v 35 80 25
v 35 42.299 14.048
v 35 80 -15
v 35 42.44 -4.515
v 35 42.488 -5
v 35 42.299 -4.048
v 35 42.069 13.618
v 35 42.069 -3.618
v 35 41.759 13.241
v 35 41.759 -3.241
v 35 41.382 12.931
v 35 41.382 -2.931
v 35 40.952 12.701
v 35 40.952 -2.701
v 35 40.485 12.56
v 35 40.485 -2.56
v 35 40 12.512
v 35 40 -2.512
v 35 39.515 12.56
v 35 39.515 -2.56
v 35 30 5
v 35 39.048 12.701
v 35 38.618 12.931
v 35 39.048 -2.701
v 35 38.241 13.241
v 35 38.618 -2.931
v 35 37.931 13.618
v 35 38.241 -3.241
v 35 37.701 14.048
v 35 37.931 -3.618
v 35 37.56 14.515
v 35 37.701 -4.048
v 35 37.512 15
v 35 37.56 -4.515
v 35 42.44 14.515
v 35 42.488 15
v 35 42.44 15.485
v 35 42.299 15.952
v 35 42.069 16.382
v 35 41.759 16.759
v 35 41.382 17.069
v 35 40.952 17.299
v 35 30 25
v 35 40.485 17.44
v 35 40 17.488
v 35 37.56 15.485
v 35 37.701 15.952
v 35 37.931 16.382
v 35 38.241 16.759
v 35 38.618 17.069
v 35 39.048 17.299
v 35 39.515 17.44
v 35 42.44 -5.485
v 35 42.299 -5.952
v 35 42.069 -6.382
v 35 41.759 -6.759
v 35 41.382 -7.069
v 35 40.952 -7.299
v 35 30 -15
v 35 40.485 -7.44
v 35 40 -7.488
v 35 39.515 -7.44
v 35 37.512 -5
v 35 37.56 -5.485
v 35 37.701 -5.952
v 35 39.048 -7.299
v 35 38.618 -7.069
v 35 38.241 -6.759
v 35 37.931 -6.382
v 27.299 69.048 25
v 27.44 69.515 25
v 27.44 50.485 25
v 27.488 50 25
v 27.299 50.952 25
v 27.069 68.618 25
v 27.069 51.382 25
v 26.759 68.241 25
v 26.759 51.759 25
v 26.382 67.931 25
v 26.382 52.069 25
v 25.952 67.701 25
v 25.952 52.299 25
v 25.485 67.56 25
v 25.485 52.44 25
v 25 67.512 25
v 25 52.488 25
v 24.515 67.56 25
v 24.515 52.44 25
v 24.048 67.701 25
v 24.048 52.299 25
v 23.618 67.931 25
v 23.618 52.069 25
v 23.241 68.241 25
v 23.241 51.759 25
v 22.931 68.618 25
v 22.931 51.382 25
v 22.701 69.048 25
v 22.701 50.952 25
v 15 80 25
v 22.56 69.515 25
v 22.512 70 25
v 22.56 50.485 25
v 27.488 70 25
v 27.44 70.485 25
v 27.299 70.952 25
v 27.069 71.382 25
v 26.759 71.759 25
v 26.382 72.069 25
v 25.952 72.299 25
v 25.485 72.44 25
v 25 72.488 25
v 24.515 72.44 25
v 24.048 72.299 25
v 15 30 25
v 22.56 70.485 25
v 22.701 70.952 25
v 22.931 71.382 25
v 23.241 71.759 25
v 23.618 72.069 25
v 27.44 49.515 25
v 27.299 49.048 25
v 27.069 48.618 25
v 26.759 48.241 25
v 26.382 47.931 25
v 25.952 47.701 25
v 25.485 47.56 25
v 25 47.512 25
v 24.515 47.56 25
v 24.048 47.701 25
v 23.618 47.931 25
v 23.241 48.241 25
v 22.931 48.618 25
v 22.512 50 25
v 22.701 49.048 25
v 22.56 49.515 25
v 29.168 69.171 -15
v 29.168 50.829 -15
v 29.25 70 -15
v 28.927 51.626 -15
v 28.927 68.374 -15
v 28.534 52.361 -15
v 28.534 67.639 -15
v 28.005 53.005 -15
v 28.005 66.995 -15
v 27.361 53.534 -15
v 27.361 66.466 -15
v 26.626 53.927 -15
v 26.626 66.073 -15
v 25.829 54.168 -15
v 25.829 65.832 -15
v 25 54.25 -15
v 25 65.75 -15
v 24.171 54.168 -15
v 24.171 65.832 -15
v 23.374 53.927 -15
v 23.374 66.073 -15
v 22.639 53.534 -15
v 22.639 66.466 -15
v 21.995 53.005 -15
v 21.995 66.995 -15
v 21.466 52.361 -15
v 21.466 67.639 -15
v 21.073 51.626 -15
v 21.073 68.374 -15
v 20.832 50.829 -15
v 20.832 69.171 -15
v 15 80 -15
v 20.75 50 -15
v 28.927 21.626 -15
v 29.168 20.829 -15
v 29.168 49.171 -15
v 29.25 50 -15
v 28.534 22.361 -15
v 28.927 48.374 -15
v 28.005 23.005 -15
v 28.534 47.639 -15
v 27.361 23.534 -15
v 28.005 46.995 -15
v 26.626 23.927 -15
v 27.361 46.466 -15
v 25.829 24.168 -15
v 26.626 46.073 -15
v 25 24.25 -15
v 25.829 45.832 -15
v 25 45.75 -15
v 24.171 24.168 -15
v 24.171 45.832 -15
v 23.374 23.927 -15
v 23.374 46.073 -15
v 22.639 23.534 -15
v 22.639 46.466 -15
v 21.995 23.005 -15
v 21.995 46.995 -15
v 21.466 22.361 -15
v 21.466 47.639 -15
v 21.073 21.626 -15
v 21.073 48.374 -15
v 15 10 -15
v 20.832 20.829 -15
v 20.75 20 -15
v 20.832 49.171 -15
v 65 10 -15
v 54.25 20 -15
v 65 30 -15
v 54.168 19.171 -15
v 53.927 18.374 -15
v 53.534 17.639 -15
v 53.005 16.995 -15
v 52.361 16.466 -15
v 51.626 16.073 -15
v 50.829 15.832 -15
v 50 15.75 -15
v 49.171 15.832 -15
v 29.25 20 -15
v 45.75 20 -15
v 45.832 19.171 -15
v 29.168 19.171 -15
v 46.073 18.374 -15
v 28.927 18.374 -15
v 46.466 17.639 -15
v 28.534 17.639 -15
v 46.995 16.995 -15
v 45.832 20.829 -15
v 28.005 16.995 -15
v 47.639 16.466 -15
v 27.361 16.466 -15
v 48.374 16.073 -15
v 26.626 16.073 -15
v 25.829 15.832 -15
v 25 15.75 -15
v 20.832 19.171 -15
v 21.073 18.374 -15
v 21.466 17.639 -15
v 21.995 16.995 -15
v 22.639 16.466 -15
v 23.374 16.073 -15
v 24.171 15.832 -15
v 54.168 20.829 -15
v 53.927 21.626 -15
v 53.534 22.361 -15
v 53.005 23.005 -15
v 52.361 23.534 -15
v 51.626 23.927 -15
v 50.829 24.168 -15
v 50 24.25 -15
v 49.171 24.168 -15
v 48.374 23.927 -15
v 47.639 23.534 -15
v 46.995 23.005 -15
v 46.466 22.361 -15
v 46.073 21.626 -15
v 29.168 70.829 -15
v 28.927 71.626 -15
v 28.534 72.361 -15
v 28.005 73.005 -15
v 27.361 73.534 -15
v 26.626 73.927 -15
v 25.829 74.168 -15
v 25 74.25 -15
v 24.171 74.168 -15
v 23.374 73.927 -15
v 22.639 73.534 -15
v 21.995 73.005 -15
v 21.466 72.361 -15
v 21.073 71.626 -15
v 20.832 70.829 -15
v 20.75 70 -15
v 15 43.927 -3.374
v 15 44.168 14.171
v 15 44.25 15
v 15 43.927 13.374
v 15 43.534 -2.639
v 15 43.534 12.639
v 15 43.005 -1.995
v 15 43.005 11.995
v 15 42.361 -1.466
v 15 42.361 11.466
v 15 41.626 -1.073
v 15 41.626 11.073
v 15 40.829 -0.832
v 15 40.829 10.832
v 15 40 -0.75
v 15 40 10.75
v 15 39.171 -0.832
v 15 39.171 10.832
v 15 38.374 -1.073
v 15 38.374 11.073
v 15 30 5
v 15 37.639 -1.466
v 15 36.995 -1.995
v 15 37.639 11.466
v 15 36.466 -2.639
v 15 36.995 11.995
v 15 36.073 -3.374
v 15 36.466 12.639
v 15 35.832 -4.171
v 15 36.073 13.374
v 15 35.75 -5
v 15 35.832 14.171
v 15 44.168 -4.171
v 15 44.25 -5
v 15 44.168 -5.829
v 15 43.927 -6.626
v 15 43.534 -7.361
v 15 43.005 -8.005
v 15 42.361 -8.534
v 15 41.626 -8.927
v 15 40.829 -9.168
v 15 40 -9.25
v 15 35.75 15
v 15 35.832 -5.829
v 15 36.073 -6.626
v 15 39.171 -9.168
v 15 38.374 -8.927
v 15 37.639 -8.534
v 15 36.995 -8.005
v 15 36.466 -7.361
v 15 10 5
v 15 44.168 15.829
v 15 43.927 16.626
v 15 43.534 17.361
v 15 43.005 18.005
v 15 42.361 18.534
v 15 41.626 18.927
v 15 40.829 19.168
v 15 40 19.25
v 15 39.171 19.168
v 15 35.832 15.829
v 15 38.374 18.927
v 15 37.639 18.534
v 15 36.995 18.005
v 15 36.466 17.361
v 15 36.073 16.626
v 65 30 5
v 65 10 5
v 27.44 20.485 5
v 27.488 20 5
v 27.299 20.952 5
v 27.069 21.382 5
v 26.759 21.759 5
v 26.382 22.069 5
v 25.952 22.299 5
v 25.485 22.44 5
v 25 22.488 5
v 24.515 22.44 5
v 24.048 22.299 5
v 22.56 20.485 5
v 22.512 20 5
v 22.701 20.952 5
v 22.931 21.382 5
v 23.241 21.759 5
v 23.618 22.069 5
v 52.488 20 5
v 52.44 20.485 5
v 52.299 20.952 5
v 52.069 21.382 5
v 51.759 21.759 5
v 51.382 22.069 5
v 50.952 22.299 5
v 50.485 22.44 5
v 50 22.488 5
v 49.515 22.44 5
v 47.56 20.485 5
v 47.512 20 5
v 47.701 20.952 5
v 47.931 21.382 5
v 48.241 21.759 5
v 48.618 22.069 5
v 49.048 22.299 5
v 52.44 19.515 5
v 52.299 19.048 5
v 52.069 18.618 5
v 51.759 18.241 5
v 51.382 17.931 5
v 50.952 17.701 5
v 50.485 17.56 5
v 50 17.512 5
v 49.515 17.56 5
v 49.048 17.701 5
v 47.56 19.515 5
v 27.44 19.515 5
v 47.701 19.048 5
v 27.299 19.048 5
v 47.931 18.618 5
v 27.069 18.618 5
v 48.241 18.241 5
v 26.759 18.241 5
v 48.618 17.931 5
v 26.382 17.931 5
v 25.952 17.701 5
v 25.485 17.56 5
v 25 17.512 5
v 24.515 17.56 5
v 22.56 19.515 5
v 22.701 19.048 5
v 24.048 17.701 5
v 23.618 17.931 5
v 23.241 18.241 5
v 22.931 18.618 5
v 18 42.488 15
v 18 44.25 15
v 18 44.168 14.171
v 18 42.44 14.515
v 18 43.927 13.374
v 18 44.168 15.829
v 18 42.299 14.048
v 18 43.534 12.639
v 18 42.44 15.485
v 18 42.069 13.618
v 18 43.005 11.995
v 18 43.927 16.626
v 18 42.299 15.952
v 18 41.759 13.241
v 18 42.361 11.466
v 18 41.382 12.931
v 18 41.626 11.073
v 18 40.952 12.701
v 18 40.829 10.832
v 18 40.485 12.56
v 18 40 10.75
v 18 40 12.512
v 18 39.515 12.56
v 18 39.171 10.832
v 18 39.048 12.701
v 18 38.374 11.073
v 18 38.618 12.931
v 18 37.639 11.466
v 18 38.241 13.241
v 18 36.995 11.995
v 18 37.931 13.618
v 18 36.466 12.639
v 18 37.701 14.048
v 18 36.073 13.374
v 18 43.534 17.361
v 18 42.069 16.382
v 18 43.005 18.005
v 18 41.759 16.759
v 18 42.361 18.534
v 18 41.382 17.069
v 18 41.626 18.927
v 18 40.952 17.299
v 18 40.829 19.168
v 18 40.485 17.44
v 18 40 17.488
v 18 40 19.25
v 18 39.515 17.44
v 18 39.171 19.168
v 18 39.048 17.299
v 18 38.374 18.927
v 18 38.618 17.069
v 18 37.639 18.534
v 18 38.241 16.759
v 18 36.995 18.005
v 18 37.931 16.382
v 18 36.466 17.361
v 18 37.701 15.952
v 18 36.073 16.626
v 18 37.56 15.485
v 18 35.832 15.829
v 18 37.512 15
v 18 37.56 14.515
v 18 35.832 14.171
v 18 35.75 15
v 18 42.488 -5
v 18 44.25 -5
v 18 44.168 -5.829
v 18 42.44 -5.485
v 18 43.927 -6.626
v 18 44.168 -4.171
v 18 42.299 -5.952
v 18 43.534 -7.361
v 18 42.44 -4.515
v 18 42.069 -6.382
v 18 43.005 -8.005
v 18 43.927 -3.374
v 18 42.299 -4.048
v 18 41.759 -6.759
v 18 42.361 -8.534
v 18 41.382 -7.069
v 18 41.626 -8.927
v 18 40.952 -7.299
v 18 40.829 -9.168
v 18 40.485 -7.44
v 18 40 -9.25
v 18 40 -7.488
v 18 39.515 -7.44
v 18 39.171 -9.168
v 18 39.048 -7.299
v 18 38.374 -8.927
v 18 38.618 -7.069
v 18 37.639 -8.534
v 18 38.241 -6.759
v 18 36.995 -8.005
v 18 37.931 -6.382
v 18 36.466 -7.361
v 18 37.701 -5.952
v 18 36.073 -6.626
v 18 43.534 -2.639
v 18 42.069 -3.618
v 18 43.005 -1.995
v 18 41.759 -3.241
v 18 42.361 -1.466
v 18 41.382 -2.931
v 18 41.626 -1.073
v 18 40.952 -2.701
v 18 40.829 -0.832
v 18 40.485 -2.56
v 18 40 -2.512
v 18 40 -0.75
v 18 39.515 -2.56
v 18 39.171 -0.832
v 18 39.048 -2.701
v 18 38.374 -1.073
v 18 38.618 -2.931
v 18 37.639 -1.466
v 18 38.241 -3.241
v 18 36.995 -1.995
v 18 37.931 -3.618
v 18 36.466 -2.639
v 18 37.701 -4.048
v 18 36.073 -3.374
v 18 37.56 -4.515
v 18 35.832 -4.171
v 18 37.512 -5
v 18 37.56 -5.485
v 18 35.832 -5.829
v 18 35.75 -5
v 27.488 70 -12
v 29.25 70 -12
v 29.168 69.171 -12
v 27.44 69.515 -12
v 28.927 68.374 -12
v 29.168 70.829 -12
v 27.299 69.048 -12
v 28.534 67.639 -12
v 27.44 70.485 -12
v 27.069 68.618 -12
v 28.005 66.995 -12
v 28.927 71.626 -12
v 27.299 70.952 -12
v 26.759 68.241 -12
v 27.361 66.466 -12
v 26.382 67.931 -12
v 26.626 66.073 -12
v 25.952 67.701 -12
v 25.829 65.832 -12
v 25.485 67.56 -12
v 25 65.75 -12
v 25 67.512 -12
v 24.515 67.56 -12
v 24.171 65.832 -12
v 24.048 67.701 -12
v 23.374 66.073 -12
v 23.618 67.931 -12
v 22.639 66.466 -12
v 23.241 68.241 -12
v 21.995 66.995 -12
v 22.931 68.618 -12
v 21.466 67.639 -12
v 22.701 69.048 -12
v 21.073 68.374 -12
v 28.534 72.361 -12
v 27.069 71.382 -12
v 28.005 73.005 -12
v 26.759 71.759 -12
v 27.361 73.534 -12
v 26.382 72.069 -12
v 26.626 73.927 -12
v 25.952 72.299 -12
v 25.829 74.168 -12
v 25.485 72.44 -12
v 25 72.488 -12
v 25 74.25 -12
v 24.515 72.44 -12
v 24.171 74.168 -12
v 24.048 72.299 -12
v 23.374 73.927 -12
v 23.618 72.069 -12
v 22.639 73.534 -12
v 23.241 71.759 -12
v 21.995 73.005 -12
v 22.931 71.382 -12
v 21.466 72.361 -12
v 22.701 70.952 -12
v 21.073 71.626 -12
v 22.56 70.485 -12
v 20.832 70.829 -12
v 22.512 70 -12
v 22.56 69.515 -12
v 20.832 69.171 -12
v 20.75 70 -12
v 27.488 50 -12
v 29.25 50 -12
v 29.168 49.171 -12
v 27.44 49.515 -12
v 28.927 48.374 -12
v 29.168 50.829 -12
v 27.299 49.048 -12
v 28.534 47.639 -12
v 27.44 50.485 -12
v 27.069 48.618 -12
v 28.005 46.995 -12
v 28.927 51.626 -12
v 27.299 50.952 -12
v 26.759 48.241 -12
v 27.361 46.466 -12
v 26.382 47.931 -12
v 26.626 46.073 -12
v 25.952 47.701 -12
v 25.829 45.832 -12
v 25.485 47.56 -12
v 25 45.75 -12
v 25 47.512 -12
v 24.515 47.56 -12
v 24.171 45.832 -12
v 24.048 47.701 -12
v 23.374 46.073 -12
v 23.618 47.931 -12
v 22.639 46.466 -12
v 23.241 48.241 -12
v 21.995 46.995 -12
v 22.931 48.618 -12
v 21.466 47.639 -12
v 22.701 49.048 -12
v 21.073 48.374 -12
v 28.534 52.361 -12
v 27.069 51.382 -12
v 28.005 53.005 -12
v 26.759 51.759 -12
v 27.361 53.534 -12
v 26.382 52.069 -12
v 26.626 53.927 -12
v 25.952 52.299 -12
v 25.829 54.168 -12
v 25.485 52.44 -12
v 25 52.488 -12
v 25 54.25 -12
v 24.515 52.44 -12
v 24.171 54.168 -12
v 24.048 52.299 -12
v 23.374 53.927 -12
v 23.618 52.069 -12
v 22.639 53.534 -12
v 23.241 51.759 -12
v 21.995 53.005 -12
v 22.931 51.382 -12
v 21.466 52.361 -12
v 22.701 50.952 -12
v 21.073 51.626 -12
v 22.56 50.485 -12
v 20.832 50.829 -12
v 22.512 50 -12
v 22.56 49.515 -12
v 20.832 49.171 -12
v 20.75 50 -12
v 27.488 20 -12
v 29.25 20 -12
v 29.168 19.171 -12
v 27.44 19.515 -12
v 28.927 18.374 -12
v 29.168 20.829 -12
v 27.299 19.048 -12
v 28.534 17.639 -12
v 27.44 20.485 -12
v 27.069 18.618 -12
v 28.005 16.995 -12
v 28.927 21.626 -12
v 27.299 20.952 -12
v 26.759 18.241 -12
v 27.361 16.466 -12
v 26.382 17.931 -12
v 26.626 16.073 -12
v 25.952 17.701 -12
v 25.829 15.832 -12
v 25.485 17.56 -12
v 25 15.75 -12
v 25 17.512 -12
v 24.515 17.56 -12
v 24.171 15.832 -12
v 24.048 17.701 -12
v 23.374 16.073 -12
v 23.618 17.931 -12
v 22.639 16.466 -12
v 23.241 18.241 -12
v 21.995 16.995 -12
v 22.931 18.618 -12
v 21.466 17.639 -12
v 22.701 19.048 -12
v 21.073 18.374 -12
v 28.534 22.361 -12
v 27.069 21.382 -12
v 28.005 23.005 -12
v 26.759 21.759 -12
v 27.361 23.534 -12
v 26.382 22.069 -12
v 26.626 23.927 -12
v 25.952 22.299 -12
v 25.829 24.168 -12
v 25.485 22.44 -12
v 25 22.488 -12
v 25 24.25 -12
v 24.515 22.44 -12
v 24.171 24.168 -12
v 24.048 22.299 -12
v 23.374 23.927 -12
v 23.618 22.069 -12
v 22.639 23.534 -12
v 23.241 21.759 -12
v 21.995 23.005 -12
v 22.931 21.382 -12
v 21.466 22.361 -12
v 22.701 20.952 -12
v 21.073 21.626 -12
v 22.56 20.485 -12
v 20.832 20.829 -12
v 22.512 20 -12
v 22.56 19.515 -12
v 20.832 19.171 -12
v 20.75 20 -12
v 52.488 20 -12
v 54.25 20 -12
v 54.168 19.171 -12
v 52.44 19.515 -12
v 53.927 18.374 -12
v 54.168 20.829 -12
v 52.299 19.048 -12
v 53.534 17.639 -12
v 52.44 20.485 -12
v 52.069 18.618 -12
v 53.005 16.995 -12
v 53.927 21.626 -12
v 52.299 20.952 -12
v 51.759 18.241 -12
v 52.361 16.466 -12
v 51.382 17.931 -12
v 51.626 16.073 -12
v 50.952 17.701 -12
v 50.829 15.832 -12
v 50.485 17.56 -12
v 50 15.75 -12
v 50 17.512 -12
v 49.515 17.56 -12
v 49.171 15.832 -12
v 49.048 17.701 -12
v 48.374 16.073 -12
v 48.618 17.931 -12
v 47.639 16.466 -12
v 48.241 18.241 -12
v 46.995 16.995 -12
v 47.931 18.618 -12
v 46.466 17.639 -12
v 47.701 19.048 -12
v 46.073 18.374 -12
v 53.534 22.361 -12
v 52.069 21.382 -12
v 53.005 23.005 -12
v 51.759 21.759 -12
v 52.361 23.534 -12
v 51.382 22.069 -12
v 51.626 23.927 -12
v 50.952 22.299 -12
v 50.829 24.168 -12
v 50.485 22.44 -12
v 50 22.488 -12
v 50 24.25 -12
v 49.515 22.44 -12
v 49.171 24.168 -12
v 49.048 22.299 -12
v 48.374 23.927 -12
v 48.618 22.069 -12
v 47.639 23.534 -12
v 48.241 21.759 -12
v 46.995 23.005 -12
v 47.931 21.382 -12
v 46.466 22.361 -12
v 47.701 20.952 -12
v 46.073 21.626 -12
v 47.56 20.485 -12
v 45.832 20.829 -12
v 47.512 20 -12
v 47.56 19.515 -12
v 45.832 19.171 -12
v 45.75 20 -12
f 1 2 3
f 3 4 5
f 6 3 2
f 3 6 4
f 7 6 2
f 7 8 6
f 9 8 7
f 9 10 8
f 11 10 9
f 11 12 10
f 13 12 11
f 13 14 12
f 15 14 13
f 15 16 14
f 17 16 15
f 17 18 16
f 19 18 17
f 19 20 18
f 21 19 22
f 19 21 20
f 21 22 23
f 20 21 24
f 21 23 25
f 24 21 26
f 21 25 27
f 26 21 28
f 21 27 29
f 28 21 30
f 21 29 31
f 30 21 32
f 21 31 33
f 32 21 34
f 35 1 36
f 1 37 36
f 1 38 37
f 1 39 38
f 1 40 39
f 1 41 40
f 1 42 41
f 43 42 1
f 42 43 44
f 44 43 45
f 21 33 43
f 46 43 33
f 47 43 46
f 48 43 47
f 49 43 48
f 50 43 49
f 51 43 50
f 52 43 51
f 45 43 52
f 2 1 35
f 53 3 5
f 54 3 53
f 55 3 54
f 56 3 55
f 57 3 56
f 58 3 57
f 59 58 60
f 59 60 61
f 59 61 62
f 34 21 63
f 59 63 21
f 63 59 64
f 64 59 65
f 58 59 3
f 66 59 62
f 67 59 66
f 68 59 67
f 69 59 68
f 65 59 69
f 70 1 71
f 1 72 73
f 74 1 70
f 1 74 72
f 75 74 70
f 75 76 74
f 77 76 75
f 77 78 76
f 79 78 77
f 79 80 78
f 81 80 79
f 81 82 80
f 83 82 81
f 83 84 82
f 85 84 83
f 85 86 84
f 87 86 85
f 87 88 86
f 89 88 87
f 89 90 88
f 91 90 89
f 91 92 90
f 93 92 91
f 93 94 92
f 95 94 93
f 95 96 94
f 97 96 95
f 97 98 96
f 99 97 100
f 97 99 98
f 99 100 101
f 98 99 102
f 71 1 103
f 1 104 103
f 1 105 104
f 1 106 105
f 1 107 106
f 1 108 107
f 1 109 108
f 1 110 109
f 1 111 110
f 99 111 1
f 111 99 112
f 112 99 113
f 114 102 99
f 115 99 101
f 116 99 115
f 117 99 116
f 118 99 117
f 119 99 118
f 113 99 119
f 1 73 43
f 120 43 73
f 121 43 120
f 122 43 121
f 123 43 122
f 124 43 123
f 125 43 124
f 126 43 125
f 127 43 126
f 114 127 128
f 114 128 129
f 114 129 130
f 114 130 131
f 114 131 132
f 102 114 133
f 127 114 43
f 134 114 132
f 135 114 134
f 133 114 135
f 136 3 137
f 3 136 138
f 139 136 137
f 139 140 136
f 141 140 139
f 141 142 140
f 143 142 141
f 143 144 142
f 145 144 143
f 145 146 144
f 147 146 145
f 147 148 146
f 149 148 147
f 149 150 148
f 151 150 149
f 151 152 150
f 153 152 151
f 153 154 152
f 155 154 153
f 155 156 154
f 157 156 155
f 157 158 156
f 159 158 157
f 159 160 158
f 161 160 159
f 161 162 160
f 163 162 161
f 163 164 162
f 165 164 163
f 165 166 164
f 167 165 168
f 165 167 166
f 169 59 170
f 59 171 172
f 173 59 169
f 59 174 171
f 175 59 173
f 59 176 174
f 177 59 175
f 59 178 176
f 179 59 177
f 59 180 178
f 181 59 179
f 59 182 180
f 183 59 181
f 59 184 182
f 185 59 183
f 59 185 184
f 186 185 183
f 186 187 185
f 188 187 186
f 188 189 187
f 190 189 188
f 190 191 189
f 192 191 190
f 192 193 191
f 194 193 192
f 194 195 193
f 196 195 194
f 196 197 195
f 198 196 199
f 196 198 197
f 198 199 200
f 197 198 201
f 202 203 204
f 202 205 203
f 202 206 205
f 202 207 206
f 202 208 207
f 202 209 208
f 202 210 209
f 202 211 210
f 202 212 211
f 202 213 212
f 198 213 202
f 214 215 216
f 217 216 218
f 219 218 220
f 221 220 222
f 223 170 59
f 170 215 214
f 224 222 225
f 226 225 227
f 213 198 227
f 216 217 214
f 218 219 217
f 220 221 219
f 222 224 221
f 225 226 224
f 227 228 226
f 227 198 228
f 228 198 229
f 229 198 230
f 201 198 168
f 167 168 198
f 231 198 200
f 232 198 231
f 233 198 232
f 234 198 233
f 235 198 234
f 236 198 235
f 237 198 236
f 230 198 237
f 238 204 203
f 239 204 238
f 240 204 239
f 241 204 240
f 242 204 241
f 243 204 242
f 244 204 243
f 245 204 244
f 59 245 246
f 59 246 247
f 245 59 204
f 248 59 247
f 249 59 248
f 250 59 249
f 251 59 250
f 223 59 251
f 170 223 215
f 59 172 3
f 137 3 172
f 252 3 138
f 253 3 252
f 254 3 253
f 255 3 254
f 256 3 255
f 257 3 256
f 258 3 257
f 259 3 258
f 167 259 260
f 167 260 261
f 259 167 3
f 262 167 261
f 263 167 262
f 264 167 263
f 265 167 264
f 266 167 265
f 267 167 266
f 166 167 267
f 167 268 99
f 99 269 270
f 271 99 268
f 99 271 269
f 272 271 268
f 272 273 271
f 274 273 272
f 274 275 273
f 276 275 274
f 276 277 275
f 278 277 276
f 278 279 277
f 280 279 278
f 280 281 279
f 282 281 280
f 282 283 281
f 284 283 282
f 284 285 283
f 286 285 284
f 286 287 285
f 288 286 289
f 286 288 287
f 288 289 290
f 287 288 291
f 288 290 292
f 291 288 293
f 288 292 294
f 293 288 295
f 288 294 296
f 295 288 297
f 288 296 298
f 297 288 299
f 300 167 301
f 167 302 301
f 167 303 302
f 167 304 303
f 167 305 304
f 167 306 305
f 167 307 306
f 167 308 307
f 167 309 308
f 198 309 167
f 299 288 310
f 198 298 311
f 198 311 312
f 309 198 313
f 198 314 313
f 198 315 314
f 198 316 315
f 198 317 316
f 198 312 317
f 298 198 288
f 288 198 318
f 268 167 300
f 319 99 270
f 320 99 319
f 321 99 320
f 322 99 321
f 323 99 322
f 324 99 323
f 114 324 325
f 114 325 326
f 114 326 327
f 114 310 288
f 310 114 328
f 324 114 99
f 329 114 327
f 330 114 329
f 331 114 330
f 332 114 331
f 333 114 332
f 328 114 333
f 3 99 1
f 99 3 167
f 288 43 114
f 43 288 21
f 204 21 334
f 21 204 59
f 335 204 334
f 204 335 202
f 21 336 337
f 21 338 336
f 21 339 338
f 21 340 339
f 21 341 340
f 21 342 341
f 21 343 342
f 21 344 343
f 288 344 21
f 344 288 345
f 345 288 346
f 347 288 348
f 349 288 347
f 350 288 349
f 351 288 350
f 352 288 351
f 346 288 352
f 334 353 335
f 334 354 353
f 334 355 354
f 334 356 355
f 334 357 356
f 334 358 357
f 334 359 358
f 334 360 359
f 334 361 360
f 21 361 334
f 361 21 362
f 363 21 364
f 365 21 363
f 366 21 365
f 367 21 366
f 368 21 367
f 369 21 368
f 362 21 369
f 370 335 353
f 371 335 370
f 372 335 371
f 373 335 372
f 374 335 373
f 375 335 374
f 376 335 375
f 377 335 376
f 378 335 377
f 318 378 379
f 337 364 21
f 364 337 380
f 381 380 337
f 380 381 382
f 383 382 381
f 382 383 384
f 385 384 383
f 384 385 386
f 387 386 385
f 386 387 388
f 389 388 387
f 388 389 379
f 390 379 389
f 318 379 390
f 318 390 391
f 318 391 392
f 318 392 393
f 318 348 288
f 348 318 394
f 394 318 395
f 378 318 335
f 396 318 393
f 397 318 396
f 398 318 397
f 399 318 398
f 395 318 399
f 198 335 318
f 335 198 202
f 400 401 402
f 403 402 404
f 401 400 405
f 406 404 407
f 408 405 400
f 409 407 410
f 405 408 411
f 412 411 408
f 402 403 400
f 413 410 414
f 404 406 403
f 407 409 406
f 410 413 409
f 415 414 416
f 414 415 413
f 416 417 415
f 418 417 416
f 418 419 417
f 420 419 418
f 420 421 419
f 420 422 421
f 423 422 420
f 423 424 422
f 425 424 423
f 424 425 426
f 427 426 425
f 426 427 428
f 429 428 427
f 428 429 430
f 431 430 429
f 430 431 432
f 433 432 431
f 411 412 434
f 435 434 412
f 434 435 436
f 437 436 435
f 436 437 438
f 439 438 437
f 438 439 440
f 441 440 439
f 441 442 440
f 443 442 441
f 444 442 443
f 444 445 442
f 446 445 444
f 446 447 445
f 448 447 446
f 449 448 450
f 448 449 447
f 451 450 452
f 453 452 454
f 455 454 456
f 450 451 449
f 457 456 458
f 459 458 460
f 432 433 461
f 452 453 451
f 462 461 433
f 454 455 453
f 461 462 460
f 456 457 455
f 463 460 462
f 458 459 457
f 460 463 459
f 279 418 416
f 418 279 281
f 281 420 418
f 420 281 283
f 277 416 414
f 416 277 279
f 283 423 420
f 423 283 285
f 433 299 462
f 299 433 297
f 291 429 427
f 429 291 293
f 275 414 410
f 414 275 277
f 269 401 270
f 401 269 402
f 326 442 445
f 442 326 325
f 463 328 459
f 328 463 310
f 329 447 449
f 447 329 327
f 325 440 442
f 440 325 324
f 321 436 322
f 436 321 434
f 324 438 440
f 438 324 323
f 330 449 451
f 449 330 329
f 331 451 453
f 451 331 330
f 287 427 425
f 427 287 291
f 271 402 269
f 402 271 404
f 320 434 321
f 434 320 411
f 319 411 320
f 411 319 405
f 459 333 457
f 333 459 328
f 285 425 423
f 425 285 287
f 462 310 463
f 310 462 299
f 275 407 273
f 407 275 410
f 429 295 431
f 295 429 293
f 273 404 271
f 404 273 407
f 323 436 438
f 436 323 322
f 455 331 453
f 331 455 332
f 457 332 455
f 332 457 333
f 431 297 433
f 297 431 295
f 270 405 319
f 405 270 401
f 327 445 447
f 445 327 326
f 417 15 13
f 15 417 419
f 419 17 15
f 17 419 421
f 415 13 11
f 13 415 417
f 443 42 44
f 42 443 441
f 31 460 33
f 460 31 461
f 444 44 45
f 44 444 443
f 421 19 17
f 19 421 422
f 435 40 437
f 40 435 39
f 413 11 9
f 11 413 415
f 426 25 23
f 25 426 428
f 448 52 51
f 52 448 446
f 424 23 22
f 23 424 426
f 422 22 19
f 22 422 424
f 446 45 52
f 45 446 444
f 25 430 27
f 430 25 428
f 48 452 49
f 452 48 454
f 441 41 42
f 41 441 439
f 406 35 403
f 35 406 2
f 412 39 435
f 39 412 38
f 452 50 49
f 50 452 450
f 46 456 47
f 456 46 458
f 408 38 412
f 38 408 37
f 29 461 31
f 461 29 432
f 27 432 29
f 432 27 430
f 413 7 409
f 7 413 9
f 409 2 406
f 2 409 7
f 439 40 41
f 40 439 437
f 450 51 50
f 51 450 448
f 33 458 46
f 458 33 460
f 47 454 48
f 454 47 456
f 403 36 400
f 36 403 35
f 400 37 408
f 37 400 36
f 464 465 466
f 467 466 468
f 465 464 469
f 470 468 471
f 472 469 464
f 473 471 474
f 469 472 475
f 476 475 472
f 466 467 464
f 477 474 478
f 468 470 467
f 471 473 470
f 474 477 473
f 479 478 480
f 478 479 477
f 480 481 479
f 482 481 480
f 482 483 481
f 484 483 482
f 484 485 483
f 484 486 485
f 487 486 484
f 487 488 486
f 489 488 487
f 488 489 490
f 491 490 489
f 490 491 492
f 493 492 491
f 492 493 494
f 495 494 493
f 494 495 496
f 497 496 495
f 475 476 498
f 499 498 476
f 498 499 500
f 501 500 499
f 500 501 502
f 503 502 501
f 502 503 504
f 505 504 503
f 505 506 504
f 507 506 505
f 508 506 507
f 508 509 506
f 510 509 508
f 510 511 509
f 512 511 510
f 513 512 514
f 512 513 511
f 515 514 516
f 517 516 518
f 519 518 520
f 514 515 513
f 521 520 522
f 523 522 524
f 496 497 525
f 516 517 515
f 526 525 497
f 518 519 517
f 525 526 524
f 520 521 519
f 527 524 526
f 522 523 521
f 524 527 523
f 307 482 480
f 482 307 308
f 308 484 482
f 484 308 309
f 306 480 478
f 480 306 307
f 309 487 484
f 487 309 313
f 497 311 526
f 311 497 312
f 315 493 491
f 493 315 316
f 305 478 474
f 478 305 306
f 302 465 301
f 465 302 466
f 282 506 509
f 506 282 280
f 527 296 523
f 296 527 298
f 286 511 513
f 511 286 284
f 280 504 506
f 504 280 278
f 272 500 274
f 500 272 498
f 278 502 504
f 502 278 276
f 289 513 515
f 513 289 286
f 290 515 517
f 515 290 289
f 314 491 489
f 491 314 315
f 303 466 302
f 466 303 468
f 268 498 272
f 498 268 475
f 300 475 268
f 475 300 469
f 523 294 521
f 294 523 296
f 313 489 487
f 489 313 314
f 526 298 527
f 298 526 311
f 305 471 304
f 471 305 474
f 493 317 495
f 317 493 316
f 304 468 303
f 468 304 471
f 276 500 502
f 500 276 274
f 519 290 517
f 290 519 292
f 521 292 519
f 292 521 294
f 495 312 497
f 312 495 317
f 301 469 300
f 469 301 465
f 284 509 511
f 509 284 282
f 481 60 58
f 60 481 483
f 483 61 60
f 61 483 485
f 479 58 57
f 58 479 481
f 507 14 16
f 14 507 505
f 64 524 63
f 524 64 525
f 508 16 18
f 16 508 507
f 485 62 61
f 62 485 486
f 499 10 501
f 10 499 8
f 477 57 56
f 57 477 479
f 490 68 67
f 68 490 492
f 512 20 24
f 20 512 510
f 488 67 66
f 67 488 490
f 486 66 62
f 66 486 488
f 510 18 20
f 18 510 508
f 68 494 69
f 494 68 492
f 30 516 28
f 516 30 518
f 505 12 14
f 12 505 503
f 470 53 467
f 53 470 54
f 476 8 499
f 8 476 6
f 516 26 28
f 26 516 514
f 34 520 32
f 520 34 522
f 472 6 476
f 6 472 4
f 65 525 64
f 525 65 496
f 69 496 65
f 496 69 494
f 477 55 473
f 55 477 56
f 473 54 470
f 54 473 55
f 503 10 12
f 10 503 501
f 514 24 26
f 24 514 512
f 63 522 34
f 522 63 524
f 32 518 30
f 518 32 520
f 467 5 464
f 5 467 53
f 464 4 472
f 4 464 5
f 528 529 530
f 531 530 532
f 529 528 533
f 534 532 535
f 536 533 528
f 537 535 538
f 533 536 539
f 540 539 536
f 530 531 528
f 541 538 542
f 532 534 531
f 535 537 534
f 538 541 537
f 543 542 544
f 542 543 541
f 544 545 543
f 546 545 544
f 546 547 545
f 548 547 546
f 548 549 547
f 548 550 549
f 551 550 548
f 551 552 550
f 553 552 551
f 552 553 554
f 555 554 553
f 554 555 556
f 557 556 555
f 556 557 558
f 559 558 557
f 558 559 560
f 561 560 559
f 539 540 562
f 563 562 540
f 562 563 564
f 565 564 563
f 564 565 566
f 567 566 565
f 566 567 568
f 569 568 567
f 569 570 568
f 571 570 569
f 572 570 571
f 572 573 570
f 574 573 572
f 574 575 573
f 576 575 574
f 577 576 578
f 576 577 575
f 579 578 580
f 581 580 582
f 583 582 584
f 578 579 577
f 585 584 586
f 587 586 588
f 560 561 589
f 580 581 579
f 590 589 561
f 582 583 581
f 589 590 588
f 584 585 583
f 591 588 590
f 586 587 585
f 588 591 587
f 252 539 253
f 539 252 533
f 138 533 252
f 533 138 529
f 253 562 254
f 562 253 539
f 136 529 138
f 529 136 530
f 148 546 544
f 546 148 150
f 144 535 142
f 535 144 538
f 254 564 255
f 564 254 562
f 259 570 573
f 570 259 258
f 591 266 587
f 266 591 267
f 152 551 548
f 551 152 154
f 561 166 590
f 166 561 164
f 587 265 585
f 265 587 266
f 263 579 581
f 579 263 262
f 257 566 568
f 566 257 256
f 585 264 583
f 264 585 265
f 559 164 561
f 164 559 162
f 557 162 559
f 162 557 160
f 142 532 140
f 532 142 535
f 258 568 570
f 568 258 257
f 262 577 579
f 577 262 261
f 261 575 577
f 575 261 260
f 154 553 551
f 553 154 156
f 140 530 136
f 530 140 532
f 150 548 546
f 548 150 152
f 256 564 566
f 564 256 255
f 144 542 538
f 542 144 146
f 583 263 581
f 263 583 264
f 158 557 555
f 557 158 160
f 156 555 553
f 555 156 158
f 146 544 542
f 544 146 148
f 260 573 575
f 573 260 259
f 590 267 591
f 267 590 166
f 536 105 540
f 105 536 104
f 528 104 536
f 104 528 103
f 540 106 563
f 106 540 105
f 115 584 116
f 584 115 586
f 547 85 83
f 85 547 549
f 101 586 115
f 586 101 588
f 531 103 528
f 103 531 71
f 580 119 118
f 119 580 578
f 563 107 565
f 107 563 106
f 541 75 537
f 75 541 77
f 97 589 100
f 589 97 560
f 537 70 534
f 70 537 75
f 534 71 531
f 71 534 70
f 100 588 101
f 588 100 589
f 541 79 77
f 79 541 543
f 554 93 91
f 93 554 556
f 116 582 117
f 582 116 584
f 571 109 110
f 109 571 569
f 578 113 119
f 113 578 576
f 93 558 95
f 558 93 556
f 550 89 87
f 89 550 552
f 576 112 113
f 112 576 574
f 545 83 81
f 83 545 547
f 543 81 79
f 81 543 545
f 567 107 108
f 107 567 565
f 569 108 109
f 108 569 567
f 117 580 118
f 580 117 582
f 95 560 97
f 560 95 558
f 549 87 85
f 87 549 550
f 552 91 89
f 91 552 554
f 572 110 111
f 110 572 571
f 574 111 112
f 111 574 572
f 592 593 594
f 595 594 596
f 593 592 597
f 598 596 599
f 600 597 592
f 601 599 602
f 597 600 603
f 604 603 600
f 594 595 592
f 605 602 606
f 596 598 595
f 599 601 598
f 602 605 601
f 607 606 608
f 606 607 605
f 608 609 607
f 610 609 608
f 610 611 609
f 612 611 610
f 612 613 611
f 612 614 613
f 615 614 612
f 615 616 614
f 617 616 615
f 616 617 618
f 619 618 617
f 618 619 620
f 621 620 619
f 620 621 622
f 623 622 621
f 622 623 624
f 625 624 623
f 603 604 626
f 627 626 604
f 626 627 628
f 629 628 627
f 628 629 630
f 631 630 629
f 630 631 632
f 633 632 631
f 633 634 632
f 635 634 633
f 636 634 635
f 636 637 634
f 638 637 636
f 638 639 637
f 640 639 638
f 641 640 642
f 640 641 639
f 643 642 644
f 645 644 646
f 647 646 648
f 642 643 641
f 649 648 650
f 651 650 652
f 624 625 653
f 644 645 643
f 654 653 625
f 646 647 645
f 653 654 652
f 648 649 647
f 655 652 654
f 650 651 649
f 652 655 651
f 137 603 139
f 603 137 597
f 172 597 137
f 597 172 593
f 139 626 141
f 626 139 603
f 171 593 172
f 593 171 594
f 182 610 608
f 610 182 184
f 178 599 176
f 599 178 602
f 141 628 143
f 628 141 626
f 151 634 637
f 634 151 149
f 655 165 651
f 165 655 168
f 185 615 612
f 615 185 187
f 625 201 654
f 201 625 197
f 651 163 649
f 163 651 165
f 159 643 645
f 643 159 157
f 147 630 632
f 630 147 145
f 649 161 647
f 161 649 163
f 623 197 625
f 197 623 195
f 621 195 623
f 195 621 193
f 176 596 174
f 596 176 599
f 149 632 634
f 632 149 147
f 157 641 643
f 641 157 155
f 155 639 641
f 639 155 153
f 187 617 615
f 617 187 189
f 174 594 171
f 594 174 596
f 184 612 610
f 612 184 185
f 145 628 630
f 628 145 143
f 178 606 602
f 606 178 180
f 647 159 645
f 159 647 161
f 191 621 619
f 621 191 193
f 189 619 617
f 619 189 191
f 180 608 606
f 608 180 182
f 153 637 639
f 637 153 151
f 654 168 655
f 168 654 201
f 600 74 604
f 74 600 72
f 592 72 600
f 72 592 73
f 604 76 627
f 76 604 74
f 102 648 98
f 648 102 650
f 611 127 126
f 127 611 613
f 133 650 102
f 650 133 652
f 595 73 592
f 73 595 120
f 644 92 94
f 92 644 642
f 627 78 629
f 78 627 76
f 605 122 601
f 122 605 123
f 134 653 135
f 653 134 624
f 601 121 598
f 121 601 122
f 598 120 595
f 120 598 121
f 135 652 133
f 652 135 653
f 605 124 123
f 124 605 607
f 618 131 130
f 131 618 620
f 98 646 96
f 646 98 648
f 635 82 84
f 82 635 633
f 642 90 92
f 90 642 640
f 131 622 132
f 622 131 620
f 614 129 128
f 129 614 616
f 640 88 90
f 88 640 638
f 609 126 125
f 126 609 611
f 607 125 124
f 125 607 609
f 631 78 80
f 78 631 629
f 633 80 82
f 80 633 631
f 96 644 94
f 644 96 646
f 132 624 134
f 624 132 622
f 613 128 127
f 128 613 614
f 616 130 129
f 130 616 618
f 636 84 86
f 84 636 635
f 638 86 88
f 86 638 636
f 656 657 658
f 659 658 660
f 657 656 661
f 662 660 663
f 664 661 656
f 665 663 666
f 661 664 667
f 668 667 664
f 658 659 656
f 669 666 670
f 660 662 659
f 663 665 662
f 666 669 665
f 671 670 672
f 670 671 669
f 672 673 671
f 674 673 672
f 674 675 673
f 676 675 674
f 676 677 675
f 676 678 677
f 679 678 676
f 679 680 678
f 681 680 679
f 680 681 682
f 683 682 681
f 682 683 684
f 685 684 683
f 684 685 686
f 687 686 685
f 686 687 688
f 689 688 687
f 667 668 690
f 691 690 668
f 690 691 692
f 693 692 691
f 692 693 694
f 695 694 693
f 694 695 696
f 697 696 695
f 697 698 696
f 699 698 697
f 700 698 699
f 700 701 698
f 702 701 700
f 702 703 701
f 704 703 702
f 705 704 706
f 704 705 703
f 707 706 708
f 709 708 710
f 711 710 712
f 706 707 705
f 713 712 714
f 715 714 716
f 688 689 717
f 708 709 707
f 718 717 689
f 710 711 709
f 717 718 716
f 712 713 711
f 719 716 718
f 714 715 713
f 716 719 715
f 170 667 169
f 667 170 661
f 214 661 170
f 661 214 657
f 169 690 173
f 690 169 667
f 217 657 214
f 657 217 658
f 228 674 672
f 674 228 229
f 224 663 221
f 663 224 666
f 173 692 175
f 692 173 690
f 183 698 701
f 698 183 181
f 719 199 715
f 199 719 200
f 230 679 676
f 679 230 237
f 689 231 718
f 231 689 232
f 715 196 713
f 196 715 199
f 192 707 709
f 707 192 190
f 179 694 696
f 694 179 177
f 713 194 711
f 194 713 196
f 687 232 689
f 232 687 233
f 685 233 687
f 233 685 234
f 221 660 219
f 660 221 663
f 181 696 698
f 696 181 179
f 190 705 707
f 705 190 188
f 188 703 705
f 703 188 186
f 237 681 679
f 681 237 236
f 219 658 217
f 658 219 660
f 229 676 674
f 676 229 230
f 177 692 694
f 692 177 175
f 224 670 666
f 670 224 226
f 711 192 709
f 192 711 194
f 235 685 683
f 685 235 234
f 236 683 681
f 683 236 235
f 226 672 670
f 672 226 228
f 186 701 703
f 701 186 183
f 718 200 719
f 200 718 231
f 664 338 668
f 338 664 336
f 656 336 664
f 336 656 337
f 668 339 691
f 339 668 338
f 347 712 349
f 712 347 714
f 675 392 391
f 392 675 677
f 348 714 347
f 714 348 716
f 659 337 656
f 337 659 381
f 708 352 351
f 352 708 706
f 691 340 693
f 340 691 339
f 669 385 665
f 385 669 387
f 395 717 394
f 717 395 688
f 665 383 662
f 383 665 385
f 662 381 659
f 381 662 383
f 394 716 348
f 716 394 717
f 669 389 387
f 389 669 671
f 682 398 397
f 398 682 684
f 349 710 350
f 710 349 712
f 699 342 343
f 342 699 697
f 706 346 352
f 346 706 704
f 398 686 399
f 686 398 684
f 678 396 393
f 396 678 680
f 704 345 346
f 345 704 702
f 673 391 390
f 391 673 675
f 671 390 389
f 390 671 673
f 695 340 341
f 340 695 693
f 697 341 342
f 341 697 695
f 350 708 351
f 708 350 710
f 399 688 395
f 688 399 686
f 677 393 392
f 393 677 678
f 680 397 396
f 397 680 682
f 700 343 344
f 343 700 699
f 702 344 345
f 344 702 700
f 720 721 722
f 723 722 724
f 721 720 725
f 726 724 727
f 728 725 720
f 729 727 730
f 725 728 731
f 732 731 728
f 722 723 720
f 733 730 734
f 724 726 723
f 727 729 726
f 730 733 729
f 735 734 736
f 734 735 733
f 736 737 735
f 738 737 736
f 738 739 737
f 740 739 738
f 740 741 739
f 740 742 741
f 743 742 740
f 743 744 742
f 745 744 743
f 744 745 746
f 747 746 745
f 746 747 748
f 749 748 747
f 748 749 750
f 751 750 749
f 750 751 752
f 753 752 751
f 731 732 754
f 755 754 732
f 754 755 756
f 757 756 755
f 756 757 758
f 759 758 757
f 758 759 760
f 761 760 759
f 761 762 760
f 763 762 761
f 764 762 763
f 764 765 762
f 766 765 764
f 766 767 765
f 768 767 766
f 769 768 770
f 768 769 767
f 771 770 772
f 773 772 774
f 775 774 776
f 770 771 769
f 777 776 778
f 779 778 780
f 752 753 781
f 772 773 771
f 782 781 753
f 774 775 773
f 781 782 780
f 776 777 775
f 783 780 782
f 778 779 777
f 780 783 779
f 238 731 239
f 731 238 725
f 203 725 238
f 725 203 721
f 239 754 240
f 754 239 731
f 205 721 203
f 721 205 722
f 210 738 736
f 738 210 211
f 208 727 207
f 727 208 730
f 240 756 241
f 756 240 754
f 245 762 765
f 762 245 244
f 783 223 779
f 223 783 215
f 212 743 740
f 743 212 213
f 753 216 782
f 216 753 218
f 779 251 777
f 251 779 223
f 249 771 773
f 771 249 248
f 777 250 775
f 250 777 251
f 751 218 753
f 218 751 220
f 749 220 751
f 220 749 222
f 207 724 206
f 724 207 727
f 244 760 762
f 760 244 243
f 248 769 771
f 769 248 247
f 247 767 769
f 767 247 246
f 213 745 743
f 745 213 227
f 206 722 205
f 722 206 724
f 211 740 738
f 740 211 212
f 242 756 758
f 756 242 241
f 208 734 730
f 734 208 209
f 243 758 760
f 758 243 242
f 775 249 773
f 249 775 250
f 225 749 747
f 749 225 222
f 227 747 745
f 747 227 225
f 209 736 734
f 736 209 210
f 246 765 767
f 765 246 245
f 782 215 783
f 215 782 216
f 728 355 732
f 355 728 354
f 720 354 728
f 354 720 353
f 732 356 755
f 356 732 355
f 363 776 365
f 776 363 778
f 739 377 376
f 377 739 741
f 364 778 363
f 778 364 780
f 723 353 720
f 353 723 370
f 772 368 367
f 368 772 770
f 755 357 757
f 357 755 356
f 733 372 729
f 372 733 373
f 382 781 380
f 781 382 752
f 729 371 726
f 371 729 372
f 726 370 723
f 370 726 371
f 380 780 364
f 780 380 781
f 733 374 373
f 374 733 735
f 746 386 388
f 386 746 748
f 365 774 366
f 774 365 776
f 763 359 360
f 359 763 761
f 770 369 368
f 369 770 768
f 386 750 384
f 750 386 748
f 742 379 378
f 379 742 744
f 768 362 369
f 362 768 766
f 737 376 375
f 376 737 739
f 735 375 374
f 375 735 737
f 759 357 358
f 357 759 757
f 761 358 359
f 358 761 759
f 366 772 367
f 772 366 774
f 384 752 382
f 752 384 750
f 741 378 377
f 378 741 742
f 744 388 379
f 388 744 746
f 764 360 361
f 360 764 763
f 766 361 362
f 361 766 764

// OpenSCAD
// file: triangle.scad
//Copyright Austin Floyd 2013
//http://www.thingiverse.com/thing:119050
//license GNU GPL
//austin.floyd at 3DprintGeeks (dot) com

//global variables.. if not set when calling wedge it will use these values. 
//The prefix st_ is to "namespace" the global variables so they're not accidentally overridden elsewhere


//The top angle of the right triangle
st_wedgeAngle=12; // [0.01:89.99]

//The height of the triangle (width auto-generated based on this)
st_wedgeHeight=27; // [0.01:200]

//Depth (thickness) of triangle
st_wedgeWidth=2.2; // [0.01:200]

//Increased or decreased percentage (50% would be 0.5) of top point vs bottom point
st_topFactor=0.5; // [0,0.1,0.2,0.3,0.4,0.5,0.6,0.7,0.8,0.9,1]

//Whether or not to center on x/y/z
st_center=false; // [true, false]

//Flip it upside down
st_invert=false; // [true, false]

//default wedge
//wedge();

//demo of several different wedges
demo();

module demo() {
	translate([0,0,15])
	wedge(angle=75,height=10, wedgeWidth=5);

	wedge(angle=75,height=5,topFactor=.25, center=true, wedgeWidth=10);

	translate([0,0,-15])
	wedge(angle=35,height=13,center=true);

	translate([0,0,-30])
	wedge(angle=35,height=6, center=true, invert=true);
}


module wedge(angle=st_wedgeAngle, height=st_wedgeHeight, wedgeWidth=st_wedgeWidth, topFactor=st_topFactor, center=st_center, invert=st_invert) {
	angle2=180-90-angle;
	hyp=height/sin(angle2);
	width=sqrt(pow(hyp,2)-pow(height,2));
	if (!invert) {
		triangle(height, width, center, topFactor, wedgeWidth);
	}
	if (invert) {
		rotate(180,[1,0,0])
		triangle(height, width, center, topFactor, wedgeWidth);
	}
}
module triangle(height=5, width=5, center=false, topFactor=0.5, wedgeWidth) {
	triangles=[[0,1,4],[5,4,1],		// top
					[1,2,5],[2,3,4],		// sides
					[3,0,4], [4,5,2],	//back
           	[2,1,0], [2,0,3]]; // base
	halfWidth=width/2;
	halfWWidth=wedgeWidth/2;
	topWidth=wedgeWidth*topFactor;
	halfTopWidth=topWidth/2;
	topHalfDiff=(wedgeWidth-topWidth)/2;
	halfHeight=height/2;
	if (center) {
		polyhedron(
  			points=[/*0*/[halfWidth,halfWWidth,-halfHeight],/*1*/[halfWidth,-halfWWidth,-halfHeight],				//front point
					  /*2*/[-halfWidth,-halfWWidth,-halfHeight],       /*3*/[-halfWidth,halfWWidth,-halfHeight], //rear point
           	  /*4*/[-halfWidth,halfTopWidth,height-halfHeight], /*5*/[-halfWidth,-halfTopWidth,height-halfHeight] ], //front/rear top 
  			triangles=triangles
		);
	}
	else {
		polyhedron(
  			points=[/*0*/[width,wedgeWidth,0],         			 /*1*/[width,0,0],				    ////front point
					  /*2*/[0,0,0],       					  			 /*3*/[0,wedgeWidth,0], 		    //rear point
           	  /*4*/[0,wedgeWidth-topHalfDiff,height],/*5*/[0,topHalfDiff,height] ],//front/back top 
  			triangles=triangles
		);
	}
}
// file: pulley.scad
use <MCAD/nuts_and_bolts.scad>;

module pulley_wall(xside)
{
   hull(){
       translate([0,0,0]) cube([20,3,2]);
       translate([8.5,0,18]) cube([3,3,2]);
       if (xside==0){
          translate([8.5,7,0]) cube([1,1,1]);
          translate([10,4,9]) rotate([90,0,0]) cylinder(r=3,h=10);
          
         } else {
          translate([8.5,-5,0]) cube([1,1,1]);
          translate([10,8,9]) rotate([90,0,0]) cylinder(r=3,h=10);
         }
       }
    
}

module pulley_body()
{
    translate([0,0,0])   pulley_wall(1);
    translate([0,22,0])  pulley_wall(0);
    %translate([10,-2,9]) rotate([90,0,180]) boltHole(3,length=28);
    %translate([10,27,9]) rotate([90,0,180]) nutHole(3); 
}

module pulley_cuts()
{
    translate([10,-2,9]) rotate([90,0,180]) boltHole(3,length=28);
    translate([10,25,9]) rotate([90,0,180]) nutHole(3);  
    translate([10,27,9]) rotate([90,0,180]) nutHole(3); 
}

module pulley()
{
	difference(){
        translate([23,21,-12]) rotate([90,0,270]) pulley_body();
        translate([23,21,-12]) rotate([90,0,270]) pulley_cuts();
        }
    

}



pulley();
// file: sensor.scad
module sensor_mount_body()
{
 union() { 
      translate([0,0,0]) rotate([90,0,0]) cube([50,15,2]); 
      translate([0,18,0]) rotate([90,0,0]) cube([50,15,2]);
      
      translate([50,-2,0]) rotate([90,0,90]) cube([20,15,2]);
      translate([0,-2,0]) rotate([90,0,90]) cube([20,15,2]);
      
      
      }
}

module sensor_mount_cuts()
{

      translate([50,7.5,7.5]) rotate([90, 0, 90]) cylinder(r=2.5, h=5, center=true, $fn=12);

}

module sensor_mount()
{
   difference() {
    sensor_mount_body();
    sensor_mount_cuts();
    
     
     }
}

sensor_mount();
// file: nemamount.scad
include <MCAD/units.scad>;
include <MCAD/materials.scad>
include <MCAD/stepper.scad>
include <MCAD/motors.scad>
use <MCAD/shapes.scad>;
use <pulley.scad>;
$fn = 32;




module motor_support(ht)
{
   difference(){
	  translate([-22.5,23.5,0]) rotate([90,0,0]) motor_support_body(ht);
      translate([0,1,0]) rotate([90,0,0]) motor_support_cuts(ht);
      }
}

module motor_support_body(ht)
{
	cube([45,ht,48.5]);

}


module motor_support_cuts(ht)
{
// Motor shaft/pulley cutout.
      translate([0,.1,0]) rotate([90, 0, 0]) cylinder(r=12, h=ht*2, center=true, $fn=60);
      // NEMA 17 stepper motor mounting screws.
      for (x = [-1, 1]) for (z = [-1, 1]) {
        scale([x, 1, z]) translate([15.5, .1, 15.5]) {
          rotate([90, 0, 0]) cylinder(r=4, h=ht*2, center=true, $fn=12);
          }
        }
}



module nema_geared_cutout()
{
    //pulley opening
    translate([16,1,21]) rotate([90,0,0]){
      cylinder (h=22, r=6.6);

      rotate([0,0,45]) {
        translate([14,0,0]) cylinder(h=22, r=1.6, $fn=12);
        translate([0,14,0]) cylinder(h=22, r=1.6, $fn=12);
        translate([-14,0,0]) cylinder(h=22, r=1.6, $fn=12);
        translate([0,-14,0]) cylinder(h=22, r=1.6, $fn=12);
      }
     
    }

    //gearhead indentation
    translate([16,-5,21]) rotate([90,0,0]) cylinder (h=3.35, r=11.25);

  
    
}

module nema_cutout()
{
// Motor shaft/pulley cutout.
      rotate([90, 0, 0]) cylinder(r=12, h=20, center=true, $fn=60);
      // NEMA 17 stepper motor mounting screws.
      for (x = [-1, 1]) for (z = [-1, 1]) {
        scale([x, 1, z]) translate([15.5, -5, 15.5]) {
          rotate([90, 0, 0]) cylinder(r=1.65, h=20, center=true, $fn=12);
          }
        }
}

module nema_motor()
{
   union(){
     nema_mount();
     %translate([0,-4,1]) rotate([90,0,0]) motor(Nema17, size=NemaLong , dualAxis=false);
     }
}

module nema_motor_inverse()
{
   union(){
     nema_mount_inverse();
     %translate([0,-4,1]) rotate([90,0,0]) motor(Nema17, size=NemaLong , dualAxis=false);
     }
}

module nema_geared_motor_inverse()
{
   union(){
     nema_geared_inverse();
     %translate([16,-7,22]) rotate([90,0,180]) motor(Nema17, NemaLong, dualAxis=false);
    
     }
}

module nema_geared_motor()
{
   union(){
     nema_geared_mount();
     %translate([16,-7,22]) rotate([90,0,180]) motor(Nema17, NemaLong, dualAxis=false);
    
     }
}

module nema_geared_mount()
{
   difference(){
      union(){
           translate([-6,-6,0]) rotate([90,0,0]) cube([45,45,7]);
           translate([-6,-13,-4]) rotate([0,0,0]) cube([45,25,5]);
           translate([-6,-13,44]) rotate([0,0,0]) cube([45,25,5]);
           }
      translate([0,0,1]) nema_geared_cutout();
      }


}

module nema_geared_inverse()
{
   difference(){
      union(){
           translate([-6,-6,0]) rotate([90,0,0]) cube([45,45,7]);
           translate([-6,-31,-4]) rotate([0,0,0]) cube([45,25,5]);
           translate([-6,-31,44]) rotate([0,0,0]) cube([45,25,5]);
           }
      translate([0,0,1]) nema_geared_cutout();
      }


}

module nema_mount_inverse()
{
   difference(){
      union(){
        translate([-22.5,0,-21.5]) rotate([90,0,0]) cube([45,45,5]);
        translate([-22.5,-5,-25]) rotate([0,0,0]) cube([45,25,5]);
        }
      translate([0,0,1]) nema_cutout();
      }
   //nema_cutout();
}

module nema_mount()
{
   difference(){
      union(){
        translate([-22.5,0,-21.5]) rotate([90,0,0]) cube([45,45,5]);
        translate([-22.5,-25,-25]) rotate([0,0,0]) cube([45,25,5]);
        }
      translate([0,0,1]) nema_cutout();
      }
   //nema_cutout();
}

module pulley_mount()
{
   
        translate([-22.5,0,-21.5]) rotate([90,0,0]) cube([45,45,5]);
        translate([-22.5,-25,-25]) rotate([0,0,0]) cube([45,25,5]);
	translate([0,5,0]) rotate([90,0,0]) cylinder(r=18,h=5);
	translate([-11.25,28,0]) rotate([0,0,-90]) pulley();     
}

//nema_motor_inverse();
translate([0,0,40]) rotate([270,0,0]) pulley_mount();
//translate([0,0,0]) motor_support(40);
//nema_geared_motor();
//nema_geared_motor_inverse();
// file: vslot.scad
include <MCAD/units.scad>;
include <MCAD/materials.scad>
use <MCAD/shapes.scad>;
use <bom.scad>;

vslot_color_black = [0.27, 0.27, 0.3];
vslot_color = Aluminum;

module vslot(length=50, sections=1, finish, cutout=0) {
	size = sections * 20;
	bom(str("vslot20x", size, "x", length), str("v-slot 20x", size, " (", length , "mm)"), ["rail", "extrusion", "structure"]);
	cutext = [[12.00,4.50],[10.00,4.50],[8.20,2.78],[8.20,5.50],[6.56,5.50],[3.90,2.84],[3.90,0.21],[3.69,0.00],[3.90,-0.21],[3.90,-2.84],[6.56,-5.50],[8.20,-5.50],[8.20,-2.78],[10.00,-4.50],[12.00,-4.50]];
	cutint = [[16.10,0.21],[16.10,2.84],[12.70,6.24],[12.70,8.78],[7.30,8.78],[7.30,6.24],[3.90,2.84],[3.90,0.21],[3.69,0.00],[3.90,-0.21],[3.90,-2.84],[7.30,-6.24],[7.30,-8.78],[12.70,-8.78],[12.70,-6.24],[16.10,-2.84],[16.10,-0.21],[16.31,0.00],];
	cutcorner = [[8.20,8.20],[6.57,8.20],[6.57,7.66],[7.66,6.57],[8.20,6.57]];

	module profile() {
        
		difference() {
         
			translate([0,0,length/2])
			roundedBox(20 * sections, 20, length, 1.5);
         if (cutout == 0){
			for(i = [0,180]) rotate([0,0,-i]) translate([10 * (sections - 1), 0, -epsilon/2]) {
				linear_extrude(length+20) polygon(cutext);
				translate([5,-2.89,-20]) cube([10,5.78,length+40]);
			}
          
			for(i = [90,270]) rotate([0,0,-i])
				for(j = [0:sections-1]) translate([0, (sections - 1) * 10 - 20 * j, -epsilon/2]) {
					linear_extrude(length+epsilon) polygon(cutext);
					translate([5,-2.89,-20]) cube([10,5.78,length+40]);
				}

			for(i = [0:sections-1]) translate([i * 20 - 10 * (sections - 1),0,-epsilon/2])
				cylinder(length+20, 2.1, 2.1);

			for(i = [90,270]) rotate([0,0,-i])
				translate([0,(sections - 1) * 10,-epsilon/2])
				linear_extrude(length+epsilon) polygon(cutcorner);
			for(i = [ 0,180]) rotate([0,0,-i])
				translate([(sections - 1) * 10,0,-epsilon/2])
				linear_extrude(length+epsilon) polygon(cutcorner);

			if(sections > 1)
				for(i = [0:sections-2]) translate([(sections - 3) * 10 - i * 20, 0, -epsilon/2])
					linear_extrude(length+epsilon) polygon(cutint);
                      }
		}
	}

      if (cutout == 1){
		 translate([0,0,length/2]) box(20 * sections, 20.2, length);
          } else {
	     if(finish)
		   color(finish) profile();
	     else
		   color(vslot_color) profile();
         }
}

module vslot20x20(length, finish) { vslot(length, 1, finish); }
module vslot20x20_cutout(length, finish) { vslot(length, 1, finish, 1); }


module vslot20x40(length, finish) { vslot(length, 2, finish); }
module vslot20x40_cutout(length, finish) { vslot(length, 2, finish, 1); }

module vslot20x60(length, finish) { vslot(length, 3, finish); }
module vslot20x60_cutout(length, finish) { vslot(length, 3, finish, 1); }

module vslot20x80(length, finish) { vslot(length, 4, finish); }
module vslot20x80_cutout(length, finish) { vslot(length, 4, finish, 1); }


module vslot_test() {
	$fn = 32;

	vslot20x20(100);

	translate([0, 40, 0])
	vslot20x40(100, vslot_color_black);

	translate([0, 80, 0])
	vslot20x60(100);

	translate([0, 120, 0])
	vslot20x80(100, vslot_color_black);

    translate([0,140,0]) vslot20x20_cutout(100);
}

vslot_test();
// file: bom.scad
module bom(code, desc, category) {
	echo(str("BOM: ",code," - ", desc, "; ", category));
}
// main file
include <MCAD/units.scad>;
include <MCAD/materials.scad>
include <MCAD/boxes.scad>;
use <MCAD/shapes.scad>;
use <MCAD/nuts_and_bolts.scad>;
use <bom.scad>;
use <vslot.scad>;
use <nemamount.scad>;
use <sensor.scad>;
use <pulley.scad>;
use <triangle.scad>;

$fn = 32;

rod_length = 500;

module xbracket_body()
{
	translate([0,0,-20]) cube([20,50,40]);
	translate([0,-20,-20]) cube([50,20,20]);
	// Z Screws
	%translate([3,10,10]) rotate([0,90,0])boltHole(5, length=35);
	%translate([3,10,-10]) rotate([0,90,0])boltHole(5, length=35);
	// Y Screws
	%translate([10,40,-17]) rotate([0,0,0])boltHole(5, length=55);
	%translate([10,20,-17]) rotate([0,0,0])boltHole(5, length=55);
	// X Screws
	%translate([10,-10,-17]) rotate([0,0,0])boltHole(5, length=55);
	%translate([35,-10,-17]) rotate([0,0,0])boltHole(5, length=35);
	
}

module xbracket_cuts()
{       // Z Screws
	translate([3,10,10]) rotate([0,90,0])boltHole(5, length=35);
	translate([3,10,-10]) rotate([0,90,0])boltHole(5, length=35);
        // Y Screws
	translate([10,40,-17]) rotate([0,0,0])boltHole(5, length=55);
	translate([10,20,-17]) rotate([0,0,0])boltHole(5, length=55);
	// X Screws
	translate([10,-10,-17]) rotate([0,0,0])boltHole(5, length=55);
	translate([35,-10,-17]) rotate([0,0,0])boltHole(5, length=35);	
	
}


module xbracket()
{
     difference(){
	    xbracket_body();
	    xbracket_cuts();
	}
}




module show_rods()
{  
   %translate([45,40,(-1 *  rod_length)+95]) rotate([0,0,0]) vslot20x20(rod_length);	
   %translate([25,-1,35]) rotate([0,90,90]) vslot20x20(rod_length);
   %translate([-1,20,15]) rotate([0,90,0]) vslot20x20(rod_length);
}



show_rods();
translate([15,30,5]) xbracket();
